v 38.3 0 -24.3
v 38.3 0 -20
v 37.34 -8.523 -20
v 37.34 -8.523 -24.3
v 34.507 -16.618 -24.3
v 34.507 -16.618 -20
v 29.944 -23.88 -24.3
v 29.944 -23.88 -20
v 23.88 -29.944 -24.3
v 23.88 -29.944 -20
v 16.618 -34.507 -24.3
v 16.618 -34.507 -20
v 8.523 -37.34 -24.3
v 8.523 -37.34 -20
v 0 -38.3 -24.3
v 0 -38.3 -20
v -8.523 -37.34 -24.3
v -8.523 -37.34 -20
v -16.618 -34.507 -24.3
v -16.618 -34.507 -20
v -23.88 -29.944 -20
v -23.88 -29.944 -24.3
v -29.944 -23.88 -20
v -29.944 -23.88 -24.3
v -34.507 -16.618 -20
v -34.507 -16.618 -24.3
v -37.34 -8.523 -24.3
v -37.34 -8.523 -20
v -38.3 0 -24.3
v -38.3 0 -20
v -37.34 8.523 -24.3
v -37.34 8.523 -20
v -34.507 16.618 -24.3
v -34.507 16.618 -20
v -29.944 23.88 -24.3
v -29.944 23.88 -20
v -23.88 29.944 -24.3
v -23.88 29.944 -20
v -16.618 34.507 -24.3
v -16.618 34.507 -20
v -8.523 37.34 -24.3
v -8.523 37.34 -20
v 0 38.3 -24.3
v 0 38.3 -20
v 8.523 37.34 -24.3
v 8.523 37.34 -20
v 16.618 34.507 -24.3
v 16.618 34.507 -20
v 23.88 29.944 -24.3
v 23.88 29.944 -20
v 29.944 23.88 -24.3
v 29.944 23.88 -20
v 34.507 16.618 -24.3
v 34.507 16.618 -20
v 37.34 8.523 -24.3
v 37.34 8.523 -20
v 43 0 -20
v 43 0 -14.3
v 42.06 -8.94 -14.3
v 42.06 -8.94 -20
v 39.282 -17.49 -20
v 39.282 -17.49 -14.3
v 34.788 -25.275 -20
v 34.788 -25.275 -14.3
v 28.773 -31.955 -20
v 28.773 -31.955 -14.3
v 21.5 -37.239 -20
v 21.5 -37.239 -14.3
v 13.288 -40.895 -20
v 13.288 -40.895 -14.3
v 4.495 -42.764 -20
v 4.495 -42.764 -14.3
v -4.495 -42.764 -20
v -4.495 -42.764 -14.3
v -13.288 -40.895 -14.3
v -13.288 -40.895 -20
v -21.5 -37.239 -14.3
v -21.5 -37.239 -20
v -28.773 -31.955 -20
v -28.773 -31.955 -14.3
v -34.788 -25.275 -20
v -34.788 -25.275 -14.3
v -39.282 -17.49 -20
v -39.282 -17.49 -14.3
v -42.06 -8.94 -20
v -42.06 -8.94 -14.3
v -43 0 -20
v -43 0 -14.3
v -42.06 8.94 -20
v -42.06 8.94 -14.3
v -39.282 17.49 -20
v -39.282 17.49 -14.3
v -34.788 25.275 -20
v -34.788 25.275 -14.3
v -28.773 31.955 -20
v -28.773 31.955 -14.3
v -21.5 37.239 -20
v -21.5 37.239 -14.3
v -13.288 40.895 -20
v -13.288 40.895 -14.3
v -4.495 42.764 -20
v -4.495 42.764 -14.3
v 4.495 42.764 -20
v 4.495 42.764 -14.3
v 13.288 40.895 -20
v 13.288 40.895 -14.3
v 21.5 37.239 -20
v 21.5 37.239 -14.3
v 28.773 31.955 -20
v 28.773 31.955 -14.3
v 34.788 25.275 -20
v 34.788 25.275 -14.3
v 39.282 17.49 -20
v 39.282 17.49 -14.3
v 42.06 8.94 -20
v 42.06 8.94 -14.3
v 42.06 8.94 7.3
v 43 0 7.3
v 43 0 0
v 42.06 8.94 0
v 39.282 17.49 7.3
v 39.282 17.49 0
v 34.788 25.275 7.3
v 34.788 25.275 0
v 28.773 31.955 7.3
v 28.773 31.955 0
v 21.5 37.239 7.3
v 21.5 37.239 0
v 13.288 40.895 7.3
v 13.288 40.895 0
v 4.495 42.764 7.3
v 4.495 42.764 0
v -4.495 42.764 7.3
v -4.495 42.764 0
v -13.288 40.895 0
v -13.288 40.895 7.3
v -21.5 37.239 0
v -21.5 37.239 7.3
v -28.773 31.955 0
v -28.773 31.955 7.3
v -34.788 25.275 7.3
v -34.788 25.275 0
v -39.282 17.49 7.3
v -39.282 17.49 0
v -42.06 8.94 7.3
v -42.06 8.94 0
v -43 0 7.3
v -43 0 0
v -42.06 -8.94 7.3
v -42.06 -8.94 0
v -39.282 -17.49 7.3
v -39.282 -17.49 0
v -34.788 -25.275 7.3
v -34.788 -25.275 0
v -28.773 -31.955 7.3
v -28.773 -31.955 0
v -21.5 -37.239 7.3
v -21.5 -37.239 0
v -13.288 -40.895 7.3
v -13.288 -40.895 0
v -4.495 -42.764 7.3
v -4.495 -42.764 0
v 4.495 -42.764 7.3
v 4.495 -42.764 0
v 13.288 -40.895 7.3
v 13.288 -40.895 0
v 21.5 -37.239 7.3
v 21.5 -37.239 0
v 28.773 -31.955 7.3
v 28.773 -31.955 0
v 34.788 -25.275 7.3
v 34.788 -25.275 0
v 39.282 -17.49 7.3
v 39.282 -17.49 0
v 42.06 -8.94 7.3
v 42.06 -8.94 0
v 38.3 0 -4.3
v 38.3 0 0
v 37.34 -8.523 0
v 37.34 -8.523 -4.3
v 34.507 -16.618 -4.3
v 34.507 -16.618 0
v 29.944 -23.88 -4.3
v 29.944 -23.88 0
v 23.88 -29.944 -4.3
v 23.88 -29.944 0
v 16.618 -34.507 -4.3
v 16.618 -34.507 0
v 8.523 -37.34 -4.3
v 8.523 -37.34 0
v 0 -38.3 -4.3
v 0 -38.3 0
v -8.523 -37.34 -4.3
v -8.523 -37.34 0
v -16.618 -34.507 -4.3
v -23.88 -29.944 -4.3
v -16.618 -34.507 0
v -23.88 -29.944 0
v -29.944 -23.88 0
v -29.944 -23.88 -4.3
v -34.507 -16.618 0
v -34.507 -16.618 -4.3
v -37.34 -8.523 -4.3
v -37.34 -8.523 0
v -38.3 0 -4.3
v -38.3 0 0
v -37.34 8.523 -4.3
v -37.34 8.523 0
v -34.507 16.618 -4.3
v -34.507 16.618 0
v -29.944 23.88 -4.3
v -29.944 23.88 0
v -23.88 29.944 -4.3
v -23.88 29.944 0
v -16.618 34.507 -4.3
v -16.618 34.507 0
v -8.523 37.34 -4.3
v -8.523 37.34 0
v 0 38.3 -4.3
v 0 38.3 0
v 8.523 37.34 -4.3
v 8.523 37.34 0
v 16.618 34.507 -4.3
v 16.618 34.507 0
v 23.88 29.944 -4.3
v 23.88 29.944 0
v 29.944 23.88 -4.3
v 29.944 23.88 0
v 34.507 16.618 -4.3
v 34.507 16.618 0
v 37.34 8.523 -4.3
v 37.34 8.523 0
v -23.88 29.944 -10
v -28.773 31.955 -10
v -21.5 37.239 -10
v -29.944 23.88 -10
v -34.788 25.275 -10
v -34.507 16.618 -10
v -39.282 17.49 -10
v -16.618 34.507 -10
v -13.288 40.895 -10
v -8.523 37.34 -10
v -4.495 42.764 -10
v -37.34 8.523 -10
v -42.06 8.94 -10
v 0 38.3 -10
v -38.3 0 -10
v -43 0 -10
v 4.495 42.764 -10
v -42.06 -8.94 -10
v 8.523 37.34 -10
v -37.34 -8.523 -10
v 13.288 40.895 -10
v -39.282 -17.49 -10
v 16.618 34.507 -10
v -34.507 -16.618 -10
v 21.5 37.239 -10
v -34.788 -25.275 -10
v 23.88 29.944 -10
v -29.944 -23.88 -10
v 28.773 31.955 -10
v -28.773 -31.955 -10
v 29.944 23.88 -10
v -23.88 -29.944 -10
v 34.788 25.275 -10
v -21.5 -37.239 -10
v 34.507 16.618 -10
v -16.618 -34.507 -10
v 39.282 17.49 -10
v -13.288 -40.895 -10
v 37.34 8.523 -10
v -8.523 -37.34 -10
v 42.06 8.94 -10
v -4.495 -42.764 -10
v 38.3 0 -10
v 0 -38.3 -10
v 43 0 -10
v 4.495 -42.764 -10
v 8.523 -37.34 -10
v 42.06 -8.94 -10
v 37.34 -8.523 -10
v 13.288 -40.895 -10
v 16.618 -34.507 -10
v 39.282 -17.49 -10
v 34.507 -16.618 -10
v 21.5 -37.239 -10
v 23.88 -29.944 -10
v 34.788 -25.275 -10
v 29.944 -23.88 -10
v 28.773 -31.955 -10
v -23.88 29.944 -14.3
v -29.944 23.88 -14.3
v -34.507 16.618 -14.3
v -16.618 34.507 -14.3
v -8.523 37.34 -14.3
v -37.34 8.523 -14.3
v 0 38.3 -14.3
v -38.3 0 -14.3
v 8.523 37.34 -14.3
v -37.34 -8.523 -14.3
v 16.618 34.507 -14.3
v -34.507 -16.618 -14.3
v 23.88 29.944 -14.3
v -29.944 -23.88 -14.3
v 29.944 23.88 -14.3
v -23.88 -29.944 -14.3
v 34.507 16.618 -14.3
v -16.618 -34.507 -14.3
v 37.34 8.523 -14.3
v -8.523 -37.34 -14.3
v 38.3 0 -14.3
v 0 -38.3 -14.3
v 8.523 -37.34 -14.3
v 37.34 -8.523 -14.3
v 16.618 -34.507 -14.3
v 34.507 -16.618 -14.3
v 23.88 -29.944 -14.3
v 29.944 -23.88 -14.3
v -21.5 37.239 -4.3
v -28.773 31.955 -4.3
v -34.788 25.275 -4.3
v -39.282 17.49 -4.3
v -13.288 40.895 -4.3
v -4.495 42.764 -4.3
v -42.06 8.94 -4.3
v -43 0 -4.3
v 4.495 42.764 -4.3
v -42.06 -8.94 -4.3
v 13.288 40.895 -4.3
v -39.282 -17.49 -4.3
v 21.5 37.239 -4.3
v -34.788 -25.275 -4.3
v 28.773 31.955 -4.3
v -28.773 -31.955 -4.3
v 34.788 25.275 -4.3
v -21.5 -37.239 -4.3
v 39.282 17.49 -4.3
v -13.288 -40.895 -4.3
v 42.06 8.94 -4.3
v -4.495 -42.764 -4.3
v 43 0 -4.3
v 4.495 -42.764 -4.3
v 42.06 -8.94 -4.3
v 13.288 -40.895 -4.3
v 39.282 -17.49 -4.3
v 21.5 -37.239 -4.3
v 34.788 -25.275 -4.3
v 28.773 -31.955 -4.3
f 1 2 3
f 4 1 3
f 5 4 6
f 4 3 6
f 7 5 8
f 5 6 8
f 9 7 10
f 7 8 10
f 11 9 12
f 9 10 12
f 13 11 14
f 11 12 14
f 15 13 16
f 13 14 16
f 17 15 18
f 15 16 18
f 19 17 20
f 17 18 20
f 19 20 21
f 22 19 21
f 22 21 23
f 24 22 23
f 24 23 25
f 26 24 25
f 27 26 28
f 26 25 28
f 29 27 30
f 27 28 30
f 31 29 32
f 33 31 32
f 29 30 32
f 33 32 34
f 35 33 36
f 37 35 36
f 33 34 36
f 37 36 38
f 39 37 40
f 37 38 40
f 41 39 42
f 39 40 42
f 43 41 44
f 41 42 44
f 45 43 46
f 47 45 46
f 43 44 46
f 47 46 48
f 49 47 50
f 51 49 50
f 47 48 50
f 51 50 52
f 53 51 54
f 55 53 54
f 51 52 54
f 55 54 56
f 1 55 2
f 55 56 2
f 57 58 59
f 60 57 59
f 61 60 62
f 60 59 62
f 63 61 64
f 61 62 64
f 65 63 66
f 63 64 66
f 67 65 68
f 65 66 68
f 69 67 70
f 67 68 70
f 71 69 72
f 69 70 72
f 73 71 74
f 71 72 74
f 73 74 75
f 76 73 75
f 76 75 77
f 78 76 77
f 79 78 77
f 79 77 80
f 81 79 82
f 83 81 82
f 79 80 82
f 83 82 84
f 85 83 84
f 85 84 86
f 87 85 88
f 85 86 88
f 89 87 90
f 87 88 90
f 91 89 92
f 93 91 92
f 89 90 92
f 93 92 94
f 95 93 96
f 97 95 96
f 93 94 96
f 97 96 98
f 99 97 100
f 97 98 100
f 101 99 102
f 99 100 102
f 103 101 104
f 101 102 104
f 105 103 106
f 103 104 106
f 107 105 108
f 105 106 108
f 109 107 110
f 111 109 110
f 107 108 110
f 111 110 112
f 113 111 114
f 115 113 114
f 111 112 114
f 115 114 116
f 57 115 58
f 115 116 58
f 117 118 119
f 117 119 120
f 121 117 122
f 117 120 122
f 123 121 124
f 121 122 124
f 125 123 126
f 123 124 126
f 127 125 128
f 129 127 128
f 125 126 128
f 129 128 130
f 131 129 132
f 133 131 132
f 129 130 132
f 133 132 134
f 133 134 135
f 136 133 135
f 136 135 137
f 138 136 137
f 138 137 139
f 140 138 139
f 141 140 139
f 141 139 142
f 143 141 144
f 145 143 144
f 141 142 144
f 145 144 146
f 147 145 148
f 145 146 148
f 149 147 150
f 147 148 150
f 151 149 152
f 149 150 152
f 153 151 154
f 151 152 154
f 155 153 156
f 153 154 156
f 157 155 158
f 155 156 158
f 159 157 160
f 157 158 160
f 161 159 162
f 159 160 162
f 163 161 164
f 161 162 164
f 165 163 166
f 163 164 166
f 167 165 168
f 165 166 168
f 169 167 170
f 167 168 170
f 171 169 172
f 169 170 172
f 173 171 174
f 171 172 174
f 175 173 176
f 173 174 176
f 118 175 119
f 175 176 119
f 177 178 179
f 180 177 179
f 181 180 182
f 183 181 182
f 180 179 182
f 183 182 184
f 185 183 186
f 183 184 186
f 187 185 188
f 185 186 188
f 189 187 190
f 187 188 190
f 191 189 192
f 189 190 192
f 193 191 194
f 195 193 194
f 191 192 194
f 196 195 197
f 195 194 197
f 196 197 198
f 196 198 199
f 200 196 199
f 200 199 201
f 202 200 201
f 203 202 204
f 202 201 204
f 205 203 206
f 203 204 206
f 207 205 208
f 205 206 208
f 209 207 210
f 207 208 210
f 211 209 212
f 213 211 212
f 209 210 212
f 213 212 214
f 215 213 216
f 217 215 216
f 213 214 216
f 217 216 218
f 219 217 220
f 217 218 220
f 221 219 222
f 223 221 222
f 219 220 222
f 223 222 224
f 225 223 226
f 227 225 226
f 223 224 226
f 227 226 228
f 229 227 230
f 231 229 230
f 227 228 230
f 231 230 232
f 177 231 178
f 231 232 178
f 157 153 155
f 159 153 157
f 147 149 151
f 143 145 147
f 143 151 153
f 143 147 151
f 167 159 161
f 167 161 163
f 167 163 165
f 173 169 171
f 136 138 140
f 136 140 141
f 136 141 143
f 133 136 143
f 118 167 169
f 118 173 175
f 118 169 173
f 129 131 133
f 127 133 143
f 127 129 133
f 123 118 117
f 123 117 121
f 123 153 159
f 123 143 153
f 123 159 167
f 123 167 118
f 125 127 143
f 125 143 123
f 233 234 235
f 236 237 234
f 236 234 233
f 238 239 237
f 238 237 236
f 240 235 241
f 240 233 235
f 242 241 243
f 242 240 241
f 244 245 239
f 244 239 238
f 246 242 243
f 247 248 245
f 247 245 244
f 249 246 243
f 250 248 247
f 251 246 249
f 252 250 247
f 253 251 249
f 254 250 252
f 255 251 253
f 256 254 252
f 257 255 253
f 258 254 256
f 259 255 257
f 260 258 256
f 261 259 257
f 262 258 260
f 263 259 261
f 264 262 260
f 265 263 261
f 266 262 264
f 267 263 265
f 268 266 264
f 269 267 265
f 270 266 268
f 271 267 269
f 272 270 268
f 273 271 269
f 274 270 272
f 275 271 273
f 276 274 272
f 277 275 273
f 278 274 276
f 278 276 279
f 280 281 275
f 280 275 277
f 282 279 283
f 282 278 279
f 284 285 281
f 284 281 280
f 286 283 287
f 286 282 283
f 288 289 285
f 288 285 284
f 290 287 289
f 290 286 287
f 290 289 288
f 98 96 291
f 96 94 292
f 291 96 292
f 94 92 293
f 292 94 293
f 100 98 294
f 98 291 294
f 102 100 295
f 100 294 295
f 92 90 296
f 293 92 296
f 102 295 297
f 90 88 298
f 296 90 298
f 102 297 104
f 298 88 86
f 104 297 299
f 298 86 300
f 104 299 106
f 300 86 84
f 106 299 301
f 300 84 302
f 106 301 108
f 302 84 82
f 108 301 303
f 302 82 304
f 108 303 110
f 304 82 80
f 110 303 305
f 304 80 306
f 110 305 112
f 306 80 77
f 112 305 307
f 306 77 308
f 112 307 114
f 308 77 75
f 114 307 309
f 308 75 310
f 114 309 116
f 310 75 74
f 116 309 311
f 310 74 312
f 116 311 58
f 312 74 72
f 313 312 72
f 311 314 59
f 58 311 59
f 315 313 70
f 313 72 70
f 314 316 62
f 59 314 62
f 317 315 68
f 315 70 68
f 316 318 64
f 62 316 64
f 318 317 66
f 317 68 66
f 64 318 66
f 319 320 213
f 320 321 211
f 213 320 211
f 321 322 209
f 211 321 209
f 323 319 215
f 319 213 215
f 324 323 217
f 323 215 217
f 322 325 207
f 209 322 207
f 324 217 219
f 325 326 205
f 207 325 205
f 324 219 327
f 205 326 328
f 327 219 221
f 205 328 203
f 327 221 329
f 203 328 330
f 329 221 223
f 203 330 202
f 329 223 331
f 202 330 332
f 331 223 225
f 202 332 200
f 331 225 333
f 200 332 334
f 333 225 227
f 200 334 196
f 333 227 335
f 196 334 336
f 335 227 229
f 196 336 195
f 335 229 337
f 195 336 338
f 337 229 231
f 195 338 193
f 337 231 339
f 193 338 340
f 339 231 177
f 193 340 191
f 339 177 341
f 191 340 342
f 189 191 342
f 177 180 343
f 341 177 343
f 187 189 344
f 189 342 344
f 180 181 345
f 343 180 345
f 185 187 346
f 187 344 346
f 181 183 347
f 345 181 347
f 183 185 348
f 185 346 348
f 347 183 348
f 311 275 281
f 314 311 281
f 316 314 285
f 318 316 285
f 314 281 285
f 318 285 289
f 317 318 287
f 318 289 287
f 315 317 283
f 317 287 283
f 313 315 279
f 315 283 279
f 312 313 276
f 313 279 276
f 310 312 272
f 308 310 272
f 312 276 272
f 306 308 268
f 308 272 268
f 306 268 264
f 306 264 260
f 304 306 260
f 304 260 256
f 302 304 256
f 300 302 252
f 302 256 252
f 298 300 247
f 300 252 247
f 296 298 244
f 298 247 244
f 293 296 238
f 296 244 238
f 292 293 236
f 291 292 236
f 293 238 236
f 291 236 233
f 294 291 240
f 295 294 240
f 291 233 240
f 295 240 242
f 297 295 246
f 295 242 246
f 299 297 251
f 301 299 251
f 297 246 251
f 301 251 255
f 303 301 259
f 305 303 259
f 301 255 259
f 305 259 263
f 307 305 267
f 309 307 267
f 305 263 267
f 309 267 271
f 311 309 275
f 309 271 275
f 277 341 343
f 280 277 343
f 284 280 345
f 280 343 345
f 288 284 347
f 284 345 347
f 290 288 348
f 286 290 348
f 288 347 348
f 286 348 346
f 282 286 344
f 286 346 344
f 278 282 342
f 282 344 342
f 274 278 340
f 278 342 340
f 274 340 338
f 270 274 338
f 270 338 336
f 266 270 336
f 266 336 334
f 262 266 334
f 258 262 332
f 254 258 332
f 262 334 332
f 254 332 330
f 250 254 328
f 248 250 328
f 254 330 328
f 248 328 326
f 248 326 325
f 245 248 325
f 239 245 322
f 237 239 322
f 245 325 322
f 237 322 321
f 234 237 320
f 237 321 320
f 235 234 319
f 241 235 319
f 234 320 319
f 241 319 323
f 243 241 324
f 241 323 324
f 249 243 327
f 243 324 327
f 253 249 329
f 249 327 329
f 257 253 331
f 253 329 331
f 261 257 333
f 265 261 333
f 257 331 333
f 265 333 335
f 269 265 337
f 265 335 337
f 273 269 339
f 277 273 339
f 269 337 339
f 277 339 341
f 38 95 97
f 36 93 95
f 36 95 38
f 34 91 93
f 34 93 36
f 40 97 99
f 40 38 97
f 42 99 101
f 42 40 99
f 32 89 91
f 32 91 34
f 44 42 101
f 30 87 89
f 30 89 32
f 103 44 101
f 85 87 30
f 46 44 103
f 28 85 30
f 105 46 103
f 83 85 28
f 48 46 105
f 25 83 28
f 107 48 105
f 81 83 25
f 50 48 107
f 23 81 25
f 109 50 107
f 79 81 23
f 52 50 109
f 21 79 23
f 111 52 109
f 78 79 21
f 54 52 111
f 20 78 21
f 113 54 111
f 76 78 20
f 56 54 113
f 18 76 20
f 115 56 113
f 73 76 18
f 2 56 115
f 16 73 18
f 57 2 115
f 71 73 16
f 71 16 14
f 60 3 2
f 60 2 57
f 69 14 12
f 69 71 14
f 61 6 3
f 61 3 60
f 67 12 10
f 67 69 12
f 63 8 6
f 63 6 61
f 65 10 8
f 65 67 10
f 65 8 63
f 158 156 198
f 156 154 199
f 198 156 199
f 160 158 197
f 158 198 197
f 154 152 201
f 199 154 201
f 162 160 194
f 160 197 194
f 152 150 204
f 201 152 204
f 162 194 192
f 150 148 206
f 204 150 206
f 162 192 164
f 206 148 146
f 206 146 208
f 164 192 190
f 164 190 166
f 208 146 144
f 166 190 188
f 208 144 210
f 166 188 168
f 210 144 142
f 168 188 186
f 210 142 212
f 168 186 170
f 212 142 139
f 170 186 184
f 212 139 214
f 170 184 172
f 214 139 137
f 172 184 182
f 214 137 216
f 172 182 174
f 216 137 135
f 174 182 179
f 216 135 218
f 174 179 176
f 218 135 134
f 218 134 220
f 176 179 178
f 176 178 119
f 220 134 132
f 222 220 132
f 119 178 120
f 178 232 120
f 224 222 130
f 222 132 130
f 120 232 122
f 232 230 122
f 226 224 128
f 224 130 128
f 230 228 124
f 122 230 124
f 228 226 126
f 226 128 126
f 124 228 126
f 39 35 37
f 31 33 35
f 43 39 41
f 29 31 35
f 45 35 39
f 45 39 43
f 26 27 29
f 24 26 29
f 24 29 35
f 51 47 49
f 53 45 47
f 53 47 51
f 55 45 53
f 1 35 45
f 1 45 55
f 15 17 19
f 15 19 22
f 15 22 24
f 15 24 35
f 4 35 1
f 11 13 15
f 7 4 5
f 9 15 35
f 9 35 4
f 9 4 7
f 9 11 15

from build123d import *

# Parameters (mm, degrees)
F0_R      = 43
F1_DEPTH  = 7.3
F2_R      = 38.3
F3_DEPTH  = 4.3
F4_R      = 43
F5_DEPTH  = 5.7
F6_R      = 38.3
F7_DEPTH  = 4.3
F8_R      = 43
F9_DEPTH  = 5.7
F10_R     = 38.3
F11_DEPTH = 4.3


with BuildPart() as f1:
    # F0 (on Top) → F1 (new body)
    with BuildSketch(Plane.XY):
        Circle(F0_R)
    extrude(amount=F1_DEPTH)

    # F2 (on face) → F3 (join)
    with BuildSketch(Plane(origin=(0, 0, 0), x_dir=(1, 0, 0), z_dir=(0, 0, -1))):
        Circle(F2_R)
    extrude(amount=F3_DEPTH)

    # F4 (on face) → F5 (join)
    with BuildSketch(Plane(origin=(0, 0, -4.3), x_dir=(1, 0, 0), z_dir=(0, 0, -1))):
        Circle(F4_R)
    extrude(amount=F5_DEPTH)

    # F6 (on face) → F7 (join)
    with BuildSketch(Plane(origin=(0, 0, -10), x_dir=(1, 0, 0), z_dir=(0, 0, -1))):
        Circle(F6_R)
    extrude(amount=F7_DEPTH)

    # F8 (on face) → F9 (join)
    with BuildSketch(Plane(origin=(0, 0, -14.3), x_dir=(1, 0, 0), z_dir=(0, 0, -1))):
        Circle(F8_R)
    extrude(amount=F9_DEPTH)

    # F10 (on face) → F11 (join)
    with BuildSketch(Plane(origin=(0, 0, -20), x_dir=(1, 0, 0), z_dir=(0, 0, -1))):
        Circle(F10_R)
    extrude(amount=F11_DEPTH)


solid = f1.part
